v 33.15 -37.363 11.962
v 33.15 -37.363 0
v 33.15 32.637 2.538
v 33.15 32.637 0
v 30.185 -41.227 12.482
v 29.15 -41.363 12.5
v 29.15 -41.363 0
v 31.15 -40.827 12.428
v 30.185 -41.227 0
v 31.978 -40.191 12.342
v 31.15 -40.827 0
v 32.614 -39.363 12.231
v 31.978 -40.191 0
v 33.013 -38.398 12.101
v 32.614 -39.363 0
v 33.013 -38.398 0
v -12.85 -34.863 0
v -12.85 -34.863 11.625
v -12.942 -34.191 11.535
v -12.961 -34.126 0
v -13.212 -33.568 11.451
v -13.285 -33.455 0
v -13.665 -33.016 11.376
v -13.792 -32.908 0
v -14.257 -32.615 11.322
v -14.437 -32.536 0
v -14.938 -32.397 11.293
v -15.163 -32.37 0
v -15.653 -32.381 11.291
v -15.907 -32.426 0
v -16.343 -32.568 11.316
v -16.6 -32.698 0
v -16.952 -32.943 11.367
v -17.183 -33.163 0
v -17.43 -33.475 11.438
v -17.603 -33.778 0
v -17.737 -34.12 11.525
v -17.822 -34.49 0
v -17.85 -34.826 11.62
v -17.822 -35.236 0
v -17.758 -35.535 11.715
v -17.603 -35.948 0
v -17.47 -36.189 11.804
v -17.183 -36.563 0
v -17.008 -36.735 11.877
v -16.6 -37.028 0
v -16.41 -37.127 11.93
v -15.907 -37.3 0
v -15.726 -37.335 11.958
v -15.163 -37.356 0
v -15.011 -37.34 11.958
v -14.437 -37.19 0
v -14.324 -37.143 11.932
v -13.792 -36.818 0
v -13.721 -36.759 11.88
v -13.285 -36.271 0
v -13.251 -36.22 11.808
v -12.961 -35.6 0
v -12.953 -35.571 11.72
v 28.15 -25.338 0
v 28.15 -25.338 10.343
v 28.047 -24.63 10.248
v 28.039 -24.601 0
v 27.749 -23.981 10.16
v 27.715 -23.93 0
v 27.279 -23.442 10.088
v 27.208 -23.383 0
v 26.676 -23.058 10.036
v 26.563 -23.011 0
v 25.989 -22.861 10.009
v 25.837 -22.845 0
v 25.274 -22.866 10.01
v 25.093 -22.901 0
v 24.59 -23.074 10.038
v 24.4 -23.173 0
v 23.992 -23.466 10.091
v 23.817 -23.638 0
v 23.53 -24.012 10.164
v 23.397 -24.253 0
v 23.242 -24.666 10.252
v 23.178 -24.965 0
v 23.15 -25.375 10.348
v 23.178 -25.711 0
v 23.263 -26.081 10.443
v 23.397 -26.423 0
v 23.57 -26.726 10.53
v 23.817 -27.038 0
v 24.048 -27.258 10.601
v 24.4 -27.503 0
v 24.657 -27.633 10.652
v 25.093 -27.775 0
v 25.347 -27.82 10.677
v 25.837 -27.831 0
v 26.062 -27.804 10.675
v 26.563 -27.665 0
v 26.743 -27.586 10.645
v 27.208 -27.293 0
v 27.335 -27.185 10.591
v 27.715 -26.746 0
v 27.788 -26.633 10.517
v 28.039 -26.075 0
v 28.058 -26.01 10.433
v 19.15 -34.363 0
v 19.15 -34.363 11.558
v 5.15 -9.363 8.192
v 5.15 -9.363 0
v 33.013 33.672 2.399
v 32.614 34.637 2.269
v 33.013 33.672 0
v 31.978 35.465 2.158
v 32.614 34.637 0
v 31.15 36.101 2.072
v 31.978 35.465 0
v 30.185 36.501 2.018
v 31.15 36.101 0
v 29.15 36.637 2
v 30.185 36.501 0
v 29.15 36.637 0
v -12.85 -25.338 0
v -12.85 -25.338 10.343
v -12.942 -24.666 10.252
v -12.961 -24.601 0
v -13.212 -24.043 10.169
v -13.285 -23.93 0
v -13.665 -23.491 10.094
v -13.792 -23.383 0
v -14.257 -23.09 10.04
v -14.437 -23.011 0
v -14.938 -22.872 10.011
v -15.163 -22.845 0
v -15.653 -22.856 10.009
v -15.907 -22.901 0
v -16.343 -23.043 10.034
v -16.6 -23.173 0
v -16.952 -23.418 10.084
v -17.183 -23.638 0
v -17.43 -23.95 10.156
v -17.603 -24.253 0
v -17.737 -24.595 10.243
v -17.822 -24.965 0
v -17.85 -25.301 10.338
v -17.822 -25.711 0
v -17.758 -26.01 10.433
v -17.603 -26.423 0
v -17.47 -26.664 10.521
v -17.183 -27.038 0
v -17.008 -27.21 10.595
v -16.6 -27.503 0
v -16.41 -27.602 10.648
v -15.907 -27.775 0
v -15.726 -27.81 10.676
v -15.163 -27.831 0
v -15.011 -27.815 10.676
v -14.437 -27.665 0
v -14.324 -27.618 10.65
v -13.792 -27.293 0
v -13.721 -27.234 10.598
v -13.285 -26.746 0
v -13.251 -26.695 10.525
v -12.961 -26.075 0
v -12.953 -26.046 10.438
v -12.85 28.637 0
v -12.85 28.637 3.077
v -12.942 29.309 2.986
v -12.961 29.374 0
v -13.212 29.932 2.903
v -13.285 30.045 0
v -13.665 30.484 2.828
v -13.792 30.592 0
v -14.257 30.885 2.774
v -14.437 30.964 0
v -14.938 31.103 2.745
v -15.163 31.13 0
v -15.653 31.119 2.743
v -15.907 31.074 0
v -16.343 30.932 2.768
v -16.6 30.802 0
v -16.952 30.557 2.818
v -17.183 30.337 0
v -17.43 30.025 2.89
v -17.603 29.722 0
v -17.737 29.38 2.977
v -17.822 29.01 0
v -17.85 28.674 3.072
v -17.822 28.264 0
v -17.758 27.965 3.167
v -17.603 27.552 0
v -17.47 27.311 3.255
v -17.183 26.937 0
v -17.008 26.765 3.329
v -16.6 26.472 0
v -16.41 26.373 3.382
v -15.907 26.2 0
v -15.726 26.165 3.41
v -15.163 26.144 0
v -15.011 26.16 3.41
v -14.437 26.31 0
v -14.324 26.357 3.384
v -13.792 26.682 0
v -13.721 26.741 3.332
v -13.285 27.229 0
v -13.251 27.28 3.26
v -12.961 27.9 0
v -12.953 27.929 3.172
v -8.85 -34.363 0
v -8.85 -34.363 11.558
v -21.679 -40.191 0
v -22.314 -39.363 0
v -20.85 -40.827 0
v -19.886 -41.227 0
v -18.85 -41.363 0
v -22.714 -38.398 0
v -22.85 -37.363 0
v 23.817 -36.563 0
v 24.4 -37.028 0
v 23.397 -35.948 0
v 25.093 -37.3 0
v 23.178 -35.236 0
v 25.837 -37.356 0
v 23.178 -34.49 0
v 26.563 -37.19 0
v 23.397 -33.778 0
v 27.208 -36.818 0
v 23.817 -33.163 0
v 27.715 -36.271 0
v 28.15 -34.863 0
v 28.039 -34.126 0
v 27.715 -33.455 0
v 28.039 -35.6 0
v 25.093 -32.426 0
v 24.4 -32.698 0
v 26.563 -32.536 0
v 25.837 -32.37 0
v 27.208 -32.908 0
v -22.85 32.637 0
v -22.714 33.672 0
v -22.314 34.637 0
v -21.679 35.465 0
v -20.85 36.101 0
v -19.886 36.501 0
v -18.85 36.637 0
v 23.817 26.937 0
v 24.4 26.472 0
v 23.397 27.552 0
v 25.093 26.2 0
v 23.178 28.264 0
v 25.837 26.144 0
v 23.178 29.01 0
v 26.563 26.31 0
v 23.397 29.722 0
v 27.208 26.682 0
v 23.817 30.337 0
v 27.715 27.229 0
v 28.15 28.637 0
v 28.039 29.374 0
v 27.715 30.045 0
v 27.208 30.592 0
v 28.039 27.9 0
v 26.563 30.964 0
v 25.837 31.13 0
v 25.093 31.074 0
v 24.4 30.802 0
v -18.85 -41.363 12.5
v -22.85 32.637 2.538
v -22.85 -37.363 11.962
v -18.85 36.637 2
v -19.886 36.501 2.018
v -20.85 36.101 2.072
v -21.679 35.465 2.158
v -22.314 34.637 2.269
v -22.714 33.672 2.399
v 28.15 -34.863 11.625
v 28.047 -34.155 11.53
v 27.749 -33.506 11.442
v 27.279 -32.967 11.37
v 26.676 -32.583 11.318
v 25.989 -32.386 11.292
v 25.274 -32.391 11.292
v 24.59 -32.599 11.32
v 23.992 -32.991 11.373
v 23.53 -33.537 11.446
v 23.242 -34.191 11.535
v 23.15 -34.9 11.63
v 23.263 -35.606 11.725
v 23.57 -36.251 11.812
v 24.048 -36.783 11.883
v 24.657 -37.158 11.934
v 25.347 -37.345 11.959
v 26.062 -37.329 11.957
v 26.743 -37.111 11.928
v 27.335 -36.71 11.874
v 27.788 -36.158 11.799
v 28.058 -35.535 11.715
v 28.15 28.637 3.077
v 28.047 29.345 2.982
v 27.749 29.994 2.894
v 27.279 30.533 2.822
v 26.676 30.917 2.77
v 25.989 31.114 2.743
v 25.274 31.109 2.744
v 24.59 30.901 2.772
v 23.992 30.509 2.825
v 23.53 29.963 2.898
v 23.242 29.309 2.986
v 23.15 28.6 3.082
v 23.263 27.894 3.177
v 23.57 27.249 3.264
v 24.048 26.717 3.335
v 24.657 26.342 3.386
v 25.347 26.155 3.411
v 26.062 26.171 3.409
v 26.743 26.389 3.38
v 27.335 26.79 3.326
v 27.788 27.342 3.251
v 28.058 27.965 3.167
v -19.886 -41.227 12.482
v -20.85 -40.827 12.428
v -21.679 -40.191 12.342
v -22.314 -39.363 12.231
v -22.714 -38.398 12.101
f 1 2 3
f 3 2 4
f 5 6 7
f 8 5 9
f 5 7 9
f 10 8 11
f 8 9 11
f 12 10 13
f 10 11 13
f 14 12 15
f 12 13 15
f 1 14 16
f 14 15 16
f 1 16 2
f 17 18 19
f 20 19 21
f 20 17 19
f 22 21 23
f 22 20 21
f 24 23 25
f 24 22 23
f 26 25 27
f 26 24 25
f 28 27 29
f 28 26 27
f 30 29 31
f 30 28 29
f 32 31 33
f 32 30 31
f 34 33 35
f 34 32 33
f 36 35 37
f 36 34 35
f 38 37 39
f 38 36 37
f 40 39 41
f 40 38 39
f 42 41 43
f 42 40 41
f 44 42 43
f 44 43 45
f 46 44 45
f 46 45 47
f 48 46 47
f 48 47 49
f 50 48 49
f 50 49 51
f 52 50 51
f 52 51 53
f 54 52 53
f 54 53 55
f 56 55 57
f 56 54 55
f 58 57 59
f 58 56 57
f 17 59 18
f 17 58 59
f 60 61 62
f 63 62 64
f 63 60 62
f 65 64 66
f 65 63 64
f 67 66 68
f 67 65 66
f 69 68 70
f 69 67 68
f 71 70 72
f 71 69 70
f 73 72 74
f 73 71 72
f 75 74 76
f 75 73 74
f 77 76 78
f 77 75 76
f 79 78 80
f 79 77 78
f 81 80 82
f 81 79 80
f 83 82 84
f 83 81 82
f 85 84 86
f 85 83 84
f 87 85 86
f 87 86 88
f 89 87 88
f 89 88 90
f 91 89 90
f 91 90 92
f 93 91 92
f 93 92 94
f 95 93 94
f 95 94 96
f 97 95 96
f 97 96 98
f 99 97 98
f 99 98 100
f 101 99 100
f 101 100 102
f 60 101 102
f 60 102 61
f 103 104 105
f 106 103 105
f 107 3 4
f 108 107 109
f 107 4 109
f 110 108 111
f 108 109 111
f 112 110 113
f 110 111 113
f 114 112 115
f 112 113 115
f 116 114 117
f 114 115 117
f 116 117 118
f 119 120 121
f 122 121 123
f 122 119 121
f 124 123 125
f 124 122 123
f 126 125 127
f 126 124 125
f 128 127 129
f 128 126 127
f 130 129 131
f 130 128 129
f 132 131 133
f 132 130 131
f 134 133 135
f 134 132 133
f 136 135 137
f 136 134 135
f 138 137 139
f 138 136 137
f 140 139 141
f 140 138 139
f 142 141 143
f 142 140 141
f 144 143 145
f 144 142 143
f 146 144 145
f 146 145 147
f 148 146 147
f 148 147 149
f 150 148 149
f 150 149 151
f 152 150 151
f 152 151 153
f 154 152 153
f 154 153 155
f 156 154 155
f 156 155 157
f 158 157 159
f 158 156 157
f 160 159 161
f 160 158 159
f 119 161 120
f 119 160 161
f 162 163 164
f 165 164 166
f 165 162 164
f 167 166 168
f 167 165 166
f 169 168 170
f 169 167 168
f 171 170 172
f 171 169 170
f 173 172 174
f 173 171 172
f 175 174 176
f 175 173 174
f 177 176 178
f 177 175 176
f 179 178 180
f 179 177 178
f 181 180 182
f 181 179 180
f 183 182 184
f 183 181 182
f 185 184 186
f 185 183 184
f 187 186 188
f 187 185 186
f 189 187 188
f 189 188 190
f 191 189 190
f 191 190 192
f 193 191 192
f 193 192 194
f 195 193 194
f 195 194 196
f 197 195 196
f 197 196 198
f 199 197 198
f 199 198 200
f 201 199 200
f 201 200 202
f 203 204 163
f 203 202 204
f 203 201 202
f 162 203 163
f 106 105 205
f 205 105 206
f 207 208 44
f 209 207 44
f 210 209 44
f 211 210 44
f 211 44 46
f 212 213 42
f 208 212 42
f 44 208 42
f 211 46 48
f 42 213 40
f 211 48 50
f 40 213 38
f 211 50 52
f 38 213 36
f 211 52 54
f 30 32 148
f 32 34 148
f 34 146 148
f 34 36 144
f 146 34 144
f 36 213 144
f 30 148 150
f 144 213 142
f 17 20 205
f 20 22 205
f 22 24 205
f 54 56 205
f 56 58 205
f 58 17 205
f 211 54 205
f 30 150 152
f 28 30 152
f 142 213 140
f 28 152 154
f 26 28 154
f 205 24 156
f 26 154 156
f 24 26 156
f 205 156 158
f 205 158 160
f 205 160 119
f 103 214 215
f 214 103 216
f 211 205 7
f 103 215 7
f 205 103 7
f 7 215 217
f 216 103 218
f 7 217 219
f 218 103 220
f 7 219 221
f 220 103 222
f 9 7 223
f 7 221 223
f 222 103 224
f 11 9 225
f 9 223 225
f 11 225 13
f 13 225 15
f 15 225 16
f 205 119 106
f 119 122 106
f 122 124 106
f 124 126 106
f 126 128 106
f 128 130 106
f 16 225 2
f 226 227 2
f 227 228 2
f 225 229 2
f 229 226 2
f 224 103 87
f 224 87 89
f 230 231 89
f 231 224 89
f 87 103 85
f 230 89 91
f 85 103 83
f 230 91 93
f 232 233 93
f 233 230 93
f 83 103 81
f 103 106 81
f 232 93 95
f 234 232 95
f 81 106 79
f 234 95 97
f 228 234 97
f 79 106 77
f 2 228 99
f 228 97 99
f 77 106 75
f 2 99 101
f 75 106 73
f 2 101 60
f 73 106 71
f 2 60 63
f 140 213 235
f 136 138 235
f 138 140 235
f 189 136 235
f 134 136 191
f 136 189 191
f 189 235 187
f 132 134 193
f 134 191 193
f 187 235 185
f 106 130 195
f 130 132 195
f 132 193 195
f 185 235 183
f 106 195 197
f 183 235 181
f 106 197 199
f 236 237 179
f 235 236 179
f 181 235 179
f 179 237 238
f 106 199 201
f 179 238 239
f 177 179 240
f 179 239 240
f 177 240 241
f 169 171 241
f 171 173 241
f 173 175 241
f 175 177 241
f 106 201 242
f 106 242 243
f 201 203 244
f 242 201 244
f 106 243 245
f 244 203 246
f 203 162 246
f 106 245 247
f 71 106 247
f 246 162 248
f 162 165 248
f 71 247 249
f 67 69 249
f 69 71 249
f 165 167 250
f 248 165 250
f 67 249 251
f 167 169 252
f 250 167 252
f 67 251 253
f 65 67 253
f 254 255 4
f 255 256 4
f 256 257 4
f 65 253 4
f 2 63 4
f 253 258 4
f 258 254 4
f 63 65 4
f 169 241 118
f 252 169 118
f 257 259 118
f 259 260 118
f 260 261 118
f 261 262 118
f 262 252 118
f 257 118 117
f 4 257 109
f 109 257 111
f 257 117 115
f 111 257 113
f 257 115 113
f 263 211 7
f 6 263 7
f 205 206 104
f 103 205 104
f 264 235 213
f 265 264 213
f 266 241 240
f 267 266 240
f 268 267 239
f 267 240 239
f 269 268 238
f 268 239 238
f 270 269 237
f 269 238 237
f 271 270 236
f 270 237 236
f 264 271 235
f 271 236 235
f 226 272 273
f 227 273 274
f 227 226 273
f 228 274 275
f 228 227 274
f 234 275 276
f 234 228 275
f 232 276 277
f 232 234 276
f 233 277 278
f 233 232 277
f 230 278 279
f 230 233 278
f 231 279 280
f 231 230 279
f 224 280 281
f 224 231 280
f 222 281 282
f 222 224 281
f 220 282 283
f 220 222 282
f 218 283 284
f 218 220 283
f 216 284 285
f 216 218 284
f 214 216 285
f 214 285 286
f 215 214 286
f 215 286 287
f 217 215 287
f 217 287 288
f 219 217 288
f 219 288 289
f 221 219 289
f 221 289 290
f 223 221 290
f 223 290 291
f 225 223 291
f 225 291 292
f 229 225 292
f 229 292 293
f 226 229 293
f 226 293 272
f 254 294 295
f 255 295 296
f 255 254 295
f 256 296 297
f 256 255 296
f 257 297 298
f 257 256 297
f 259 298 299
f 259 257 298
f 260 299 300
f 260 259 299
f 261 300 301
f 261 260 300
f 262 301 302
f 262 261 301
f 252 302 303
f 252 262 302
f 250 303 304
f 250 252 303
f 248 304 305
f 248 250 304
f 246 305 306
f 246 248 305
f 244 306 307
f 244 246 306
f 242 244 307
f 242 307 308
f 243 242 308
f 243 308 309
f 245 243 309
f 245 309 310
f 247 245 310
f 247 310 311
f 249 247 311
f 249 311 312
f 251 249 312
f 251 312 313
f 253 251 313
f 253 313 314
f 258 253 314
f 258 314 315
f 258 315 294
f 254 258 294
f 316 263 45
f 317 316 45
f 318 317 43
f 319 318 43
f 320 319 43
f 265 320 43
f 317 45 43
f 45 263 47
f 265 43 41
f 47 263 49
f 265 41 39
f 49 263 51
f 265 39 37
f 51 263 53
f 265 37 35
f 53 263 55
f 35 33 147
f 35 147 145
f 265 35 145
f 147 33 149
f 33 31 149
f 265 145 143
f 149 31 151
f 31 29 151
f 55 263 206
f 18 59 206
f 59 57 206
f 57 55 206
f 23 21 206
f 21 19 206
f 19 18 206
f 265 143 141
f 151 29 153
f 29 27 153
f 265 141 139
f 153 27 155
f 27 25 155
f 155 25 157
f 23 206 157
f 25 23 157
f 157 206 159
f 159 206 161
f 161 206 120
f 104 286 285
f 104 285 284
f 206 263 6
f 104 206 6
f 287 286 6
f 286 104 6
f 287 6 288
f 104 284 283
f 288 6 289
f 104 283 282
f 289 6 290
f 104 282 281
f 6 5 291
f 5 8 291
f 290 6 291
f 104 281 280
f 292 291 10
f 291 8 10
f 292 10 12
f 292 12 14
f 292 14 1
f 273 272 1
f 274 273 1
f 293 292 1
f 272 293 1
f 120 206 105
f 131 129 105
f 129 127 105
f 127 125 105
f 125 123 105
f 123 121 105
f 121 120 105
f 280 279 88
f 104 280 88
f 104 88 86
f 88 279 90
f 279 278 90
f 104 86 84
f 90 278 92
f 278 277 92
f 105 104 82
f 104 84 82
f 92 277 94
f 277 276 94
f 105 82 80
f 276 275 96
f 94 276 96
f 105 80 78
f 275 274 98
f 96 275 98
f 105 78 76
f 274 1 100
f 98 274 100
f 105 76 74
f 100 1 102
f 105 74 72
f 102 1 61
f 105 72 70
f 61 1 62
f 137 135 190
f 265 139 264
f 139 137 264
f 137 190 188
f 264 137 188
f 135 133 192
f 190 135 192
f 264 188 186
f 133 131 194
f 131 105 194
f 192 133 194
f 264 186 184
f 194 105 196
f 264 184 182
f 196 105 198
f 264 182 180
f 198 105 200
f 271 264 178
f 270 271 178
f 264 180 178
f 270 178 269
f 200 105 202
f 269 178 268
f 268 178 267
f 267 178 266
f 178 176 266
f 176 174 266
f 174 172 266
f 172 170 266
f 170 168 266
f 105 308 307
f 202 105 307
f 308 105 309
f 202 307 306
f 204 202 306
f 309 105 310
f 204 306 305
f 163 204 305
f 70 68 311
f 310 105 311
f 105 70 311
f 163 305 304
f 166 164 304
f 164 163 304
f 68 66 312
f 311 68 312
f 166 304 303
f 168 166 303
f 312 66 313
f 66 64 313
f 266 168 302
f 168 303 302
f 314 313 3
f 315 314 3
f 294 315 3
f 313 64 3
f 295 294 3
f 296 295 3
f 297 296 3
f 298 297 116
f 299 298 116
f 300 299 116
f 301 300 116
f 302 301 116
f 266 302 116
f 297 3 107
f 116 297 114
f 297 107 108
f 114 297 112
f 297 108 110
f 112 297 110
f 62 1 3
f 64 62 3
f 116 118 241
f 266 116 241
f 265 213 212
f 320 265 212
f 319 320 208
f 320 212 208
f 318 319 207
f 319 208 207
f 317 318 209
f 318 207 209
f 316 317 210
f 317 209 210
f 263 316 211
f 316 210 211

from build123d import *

# Parameters (mm, degrees)
F0_R          = 2.5
F1_DEPTH      = 20
F3_DEPTH      = 25
F5_DEPTH      = 33.15069
F5_DEPTH_BACK = 22.85131


with BuildPart() as f1:
    # F0 (on Top) → F1 (new body)
    with BuildSketch(Plane.XY):
        with BuildLine():
            Line((29.14969, 36.637019), (-18.85031, 36.637019))
            ThreePointArc((-18.85031, 36.637019), (-21.678737, 35.465446), (-22.85031, 32.637019))
            Line((-22.85031, 32.637019), (-22.85031, -37.362981))
            ThreePointArc((-22.85031, -37.362981), (-21.678737, -40.191408), (-18.85031, -41.362981))
            Line((-18.85031, -41.362981), (29.14969, -41.362981))
            ThreePointArc((29.14969, -41.362981), (31.978117, -40.191408), (33.14969, -37.362981))
            Line((33.14969, -37.362981), (33.14969, 32.637019))
            ThreePointArc((33.14969, 32.637019), (31.978117, 35.465446), (29.14969, 36.637019))
        make_face()
        with Locations((-15.35031, -34.862981)):
            Circle(F0_R, mode=Mode.SUBTRACT)
        with Locations((-15.35031, -25.337981)):
            Circle(F0_R, mode=Mode.SUBTRACT)
        with Locations((25.64969, -34.862981)):
            Circle(F0_R, mode=Mode.SUBTRACT)
        with Locations((25.64969, -25.337981)):
            Circle(F0_R, mode=Mode.SUBTRACT)
        with Locations((-15.35031, 28.637019)):
            Circle(F0_R, mode=Mode.SUBTRACT)
        with Locations((25.64969, 28.637019)):
            Circle(F0_R, mode=Mode.SUBTRACT)
    extrude(amount=F1_DEPTH)

    # F2 (on face) → F3 (cut)
    with BuildSketch(Plane.XY.offset(20)):
        Polygon((5.14969, -9.362981), (-8.85031, -34.362981), (19.14969, -34.362981), align=None)
    extrude(amount=-F3_DEPTH, mode=Mode.SUBTRACT)

    # F4 (on Right) → F5 (cut, two sides)
    with BuildSketch(Plane.YZ) as f5_sk:
        Polygon((36.637019, 2), (36.637019, 20), (-41.362981, 20), (-41.362981, 12.5), align=None)
    extrude(amount=F5_DEPTH, mode=Mode.SUBTRACT)
    extrude(f5_sk.sketch, amount=-F5_DEPTH_BACK, mode=Mode.SUBTRACT)


solid = f1.part
